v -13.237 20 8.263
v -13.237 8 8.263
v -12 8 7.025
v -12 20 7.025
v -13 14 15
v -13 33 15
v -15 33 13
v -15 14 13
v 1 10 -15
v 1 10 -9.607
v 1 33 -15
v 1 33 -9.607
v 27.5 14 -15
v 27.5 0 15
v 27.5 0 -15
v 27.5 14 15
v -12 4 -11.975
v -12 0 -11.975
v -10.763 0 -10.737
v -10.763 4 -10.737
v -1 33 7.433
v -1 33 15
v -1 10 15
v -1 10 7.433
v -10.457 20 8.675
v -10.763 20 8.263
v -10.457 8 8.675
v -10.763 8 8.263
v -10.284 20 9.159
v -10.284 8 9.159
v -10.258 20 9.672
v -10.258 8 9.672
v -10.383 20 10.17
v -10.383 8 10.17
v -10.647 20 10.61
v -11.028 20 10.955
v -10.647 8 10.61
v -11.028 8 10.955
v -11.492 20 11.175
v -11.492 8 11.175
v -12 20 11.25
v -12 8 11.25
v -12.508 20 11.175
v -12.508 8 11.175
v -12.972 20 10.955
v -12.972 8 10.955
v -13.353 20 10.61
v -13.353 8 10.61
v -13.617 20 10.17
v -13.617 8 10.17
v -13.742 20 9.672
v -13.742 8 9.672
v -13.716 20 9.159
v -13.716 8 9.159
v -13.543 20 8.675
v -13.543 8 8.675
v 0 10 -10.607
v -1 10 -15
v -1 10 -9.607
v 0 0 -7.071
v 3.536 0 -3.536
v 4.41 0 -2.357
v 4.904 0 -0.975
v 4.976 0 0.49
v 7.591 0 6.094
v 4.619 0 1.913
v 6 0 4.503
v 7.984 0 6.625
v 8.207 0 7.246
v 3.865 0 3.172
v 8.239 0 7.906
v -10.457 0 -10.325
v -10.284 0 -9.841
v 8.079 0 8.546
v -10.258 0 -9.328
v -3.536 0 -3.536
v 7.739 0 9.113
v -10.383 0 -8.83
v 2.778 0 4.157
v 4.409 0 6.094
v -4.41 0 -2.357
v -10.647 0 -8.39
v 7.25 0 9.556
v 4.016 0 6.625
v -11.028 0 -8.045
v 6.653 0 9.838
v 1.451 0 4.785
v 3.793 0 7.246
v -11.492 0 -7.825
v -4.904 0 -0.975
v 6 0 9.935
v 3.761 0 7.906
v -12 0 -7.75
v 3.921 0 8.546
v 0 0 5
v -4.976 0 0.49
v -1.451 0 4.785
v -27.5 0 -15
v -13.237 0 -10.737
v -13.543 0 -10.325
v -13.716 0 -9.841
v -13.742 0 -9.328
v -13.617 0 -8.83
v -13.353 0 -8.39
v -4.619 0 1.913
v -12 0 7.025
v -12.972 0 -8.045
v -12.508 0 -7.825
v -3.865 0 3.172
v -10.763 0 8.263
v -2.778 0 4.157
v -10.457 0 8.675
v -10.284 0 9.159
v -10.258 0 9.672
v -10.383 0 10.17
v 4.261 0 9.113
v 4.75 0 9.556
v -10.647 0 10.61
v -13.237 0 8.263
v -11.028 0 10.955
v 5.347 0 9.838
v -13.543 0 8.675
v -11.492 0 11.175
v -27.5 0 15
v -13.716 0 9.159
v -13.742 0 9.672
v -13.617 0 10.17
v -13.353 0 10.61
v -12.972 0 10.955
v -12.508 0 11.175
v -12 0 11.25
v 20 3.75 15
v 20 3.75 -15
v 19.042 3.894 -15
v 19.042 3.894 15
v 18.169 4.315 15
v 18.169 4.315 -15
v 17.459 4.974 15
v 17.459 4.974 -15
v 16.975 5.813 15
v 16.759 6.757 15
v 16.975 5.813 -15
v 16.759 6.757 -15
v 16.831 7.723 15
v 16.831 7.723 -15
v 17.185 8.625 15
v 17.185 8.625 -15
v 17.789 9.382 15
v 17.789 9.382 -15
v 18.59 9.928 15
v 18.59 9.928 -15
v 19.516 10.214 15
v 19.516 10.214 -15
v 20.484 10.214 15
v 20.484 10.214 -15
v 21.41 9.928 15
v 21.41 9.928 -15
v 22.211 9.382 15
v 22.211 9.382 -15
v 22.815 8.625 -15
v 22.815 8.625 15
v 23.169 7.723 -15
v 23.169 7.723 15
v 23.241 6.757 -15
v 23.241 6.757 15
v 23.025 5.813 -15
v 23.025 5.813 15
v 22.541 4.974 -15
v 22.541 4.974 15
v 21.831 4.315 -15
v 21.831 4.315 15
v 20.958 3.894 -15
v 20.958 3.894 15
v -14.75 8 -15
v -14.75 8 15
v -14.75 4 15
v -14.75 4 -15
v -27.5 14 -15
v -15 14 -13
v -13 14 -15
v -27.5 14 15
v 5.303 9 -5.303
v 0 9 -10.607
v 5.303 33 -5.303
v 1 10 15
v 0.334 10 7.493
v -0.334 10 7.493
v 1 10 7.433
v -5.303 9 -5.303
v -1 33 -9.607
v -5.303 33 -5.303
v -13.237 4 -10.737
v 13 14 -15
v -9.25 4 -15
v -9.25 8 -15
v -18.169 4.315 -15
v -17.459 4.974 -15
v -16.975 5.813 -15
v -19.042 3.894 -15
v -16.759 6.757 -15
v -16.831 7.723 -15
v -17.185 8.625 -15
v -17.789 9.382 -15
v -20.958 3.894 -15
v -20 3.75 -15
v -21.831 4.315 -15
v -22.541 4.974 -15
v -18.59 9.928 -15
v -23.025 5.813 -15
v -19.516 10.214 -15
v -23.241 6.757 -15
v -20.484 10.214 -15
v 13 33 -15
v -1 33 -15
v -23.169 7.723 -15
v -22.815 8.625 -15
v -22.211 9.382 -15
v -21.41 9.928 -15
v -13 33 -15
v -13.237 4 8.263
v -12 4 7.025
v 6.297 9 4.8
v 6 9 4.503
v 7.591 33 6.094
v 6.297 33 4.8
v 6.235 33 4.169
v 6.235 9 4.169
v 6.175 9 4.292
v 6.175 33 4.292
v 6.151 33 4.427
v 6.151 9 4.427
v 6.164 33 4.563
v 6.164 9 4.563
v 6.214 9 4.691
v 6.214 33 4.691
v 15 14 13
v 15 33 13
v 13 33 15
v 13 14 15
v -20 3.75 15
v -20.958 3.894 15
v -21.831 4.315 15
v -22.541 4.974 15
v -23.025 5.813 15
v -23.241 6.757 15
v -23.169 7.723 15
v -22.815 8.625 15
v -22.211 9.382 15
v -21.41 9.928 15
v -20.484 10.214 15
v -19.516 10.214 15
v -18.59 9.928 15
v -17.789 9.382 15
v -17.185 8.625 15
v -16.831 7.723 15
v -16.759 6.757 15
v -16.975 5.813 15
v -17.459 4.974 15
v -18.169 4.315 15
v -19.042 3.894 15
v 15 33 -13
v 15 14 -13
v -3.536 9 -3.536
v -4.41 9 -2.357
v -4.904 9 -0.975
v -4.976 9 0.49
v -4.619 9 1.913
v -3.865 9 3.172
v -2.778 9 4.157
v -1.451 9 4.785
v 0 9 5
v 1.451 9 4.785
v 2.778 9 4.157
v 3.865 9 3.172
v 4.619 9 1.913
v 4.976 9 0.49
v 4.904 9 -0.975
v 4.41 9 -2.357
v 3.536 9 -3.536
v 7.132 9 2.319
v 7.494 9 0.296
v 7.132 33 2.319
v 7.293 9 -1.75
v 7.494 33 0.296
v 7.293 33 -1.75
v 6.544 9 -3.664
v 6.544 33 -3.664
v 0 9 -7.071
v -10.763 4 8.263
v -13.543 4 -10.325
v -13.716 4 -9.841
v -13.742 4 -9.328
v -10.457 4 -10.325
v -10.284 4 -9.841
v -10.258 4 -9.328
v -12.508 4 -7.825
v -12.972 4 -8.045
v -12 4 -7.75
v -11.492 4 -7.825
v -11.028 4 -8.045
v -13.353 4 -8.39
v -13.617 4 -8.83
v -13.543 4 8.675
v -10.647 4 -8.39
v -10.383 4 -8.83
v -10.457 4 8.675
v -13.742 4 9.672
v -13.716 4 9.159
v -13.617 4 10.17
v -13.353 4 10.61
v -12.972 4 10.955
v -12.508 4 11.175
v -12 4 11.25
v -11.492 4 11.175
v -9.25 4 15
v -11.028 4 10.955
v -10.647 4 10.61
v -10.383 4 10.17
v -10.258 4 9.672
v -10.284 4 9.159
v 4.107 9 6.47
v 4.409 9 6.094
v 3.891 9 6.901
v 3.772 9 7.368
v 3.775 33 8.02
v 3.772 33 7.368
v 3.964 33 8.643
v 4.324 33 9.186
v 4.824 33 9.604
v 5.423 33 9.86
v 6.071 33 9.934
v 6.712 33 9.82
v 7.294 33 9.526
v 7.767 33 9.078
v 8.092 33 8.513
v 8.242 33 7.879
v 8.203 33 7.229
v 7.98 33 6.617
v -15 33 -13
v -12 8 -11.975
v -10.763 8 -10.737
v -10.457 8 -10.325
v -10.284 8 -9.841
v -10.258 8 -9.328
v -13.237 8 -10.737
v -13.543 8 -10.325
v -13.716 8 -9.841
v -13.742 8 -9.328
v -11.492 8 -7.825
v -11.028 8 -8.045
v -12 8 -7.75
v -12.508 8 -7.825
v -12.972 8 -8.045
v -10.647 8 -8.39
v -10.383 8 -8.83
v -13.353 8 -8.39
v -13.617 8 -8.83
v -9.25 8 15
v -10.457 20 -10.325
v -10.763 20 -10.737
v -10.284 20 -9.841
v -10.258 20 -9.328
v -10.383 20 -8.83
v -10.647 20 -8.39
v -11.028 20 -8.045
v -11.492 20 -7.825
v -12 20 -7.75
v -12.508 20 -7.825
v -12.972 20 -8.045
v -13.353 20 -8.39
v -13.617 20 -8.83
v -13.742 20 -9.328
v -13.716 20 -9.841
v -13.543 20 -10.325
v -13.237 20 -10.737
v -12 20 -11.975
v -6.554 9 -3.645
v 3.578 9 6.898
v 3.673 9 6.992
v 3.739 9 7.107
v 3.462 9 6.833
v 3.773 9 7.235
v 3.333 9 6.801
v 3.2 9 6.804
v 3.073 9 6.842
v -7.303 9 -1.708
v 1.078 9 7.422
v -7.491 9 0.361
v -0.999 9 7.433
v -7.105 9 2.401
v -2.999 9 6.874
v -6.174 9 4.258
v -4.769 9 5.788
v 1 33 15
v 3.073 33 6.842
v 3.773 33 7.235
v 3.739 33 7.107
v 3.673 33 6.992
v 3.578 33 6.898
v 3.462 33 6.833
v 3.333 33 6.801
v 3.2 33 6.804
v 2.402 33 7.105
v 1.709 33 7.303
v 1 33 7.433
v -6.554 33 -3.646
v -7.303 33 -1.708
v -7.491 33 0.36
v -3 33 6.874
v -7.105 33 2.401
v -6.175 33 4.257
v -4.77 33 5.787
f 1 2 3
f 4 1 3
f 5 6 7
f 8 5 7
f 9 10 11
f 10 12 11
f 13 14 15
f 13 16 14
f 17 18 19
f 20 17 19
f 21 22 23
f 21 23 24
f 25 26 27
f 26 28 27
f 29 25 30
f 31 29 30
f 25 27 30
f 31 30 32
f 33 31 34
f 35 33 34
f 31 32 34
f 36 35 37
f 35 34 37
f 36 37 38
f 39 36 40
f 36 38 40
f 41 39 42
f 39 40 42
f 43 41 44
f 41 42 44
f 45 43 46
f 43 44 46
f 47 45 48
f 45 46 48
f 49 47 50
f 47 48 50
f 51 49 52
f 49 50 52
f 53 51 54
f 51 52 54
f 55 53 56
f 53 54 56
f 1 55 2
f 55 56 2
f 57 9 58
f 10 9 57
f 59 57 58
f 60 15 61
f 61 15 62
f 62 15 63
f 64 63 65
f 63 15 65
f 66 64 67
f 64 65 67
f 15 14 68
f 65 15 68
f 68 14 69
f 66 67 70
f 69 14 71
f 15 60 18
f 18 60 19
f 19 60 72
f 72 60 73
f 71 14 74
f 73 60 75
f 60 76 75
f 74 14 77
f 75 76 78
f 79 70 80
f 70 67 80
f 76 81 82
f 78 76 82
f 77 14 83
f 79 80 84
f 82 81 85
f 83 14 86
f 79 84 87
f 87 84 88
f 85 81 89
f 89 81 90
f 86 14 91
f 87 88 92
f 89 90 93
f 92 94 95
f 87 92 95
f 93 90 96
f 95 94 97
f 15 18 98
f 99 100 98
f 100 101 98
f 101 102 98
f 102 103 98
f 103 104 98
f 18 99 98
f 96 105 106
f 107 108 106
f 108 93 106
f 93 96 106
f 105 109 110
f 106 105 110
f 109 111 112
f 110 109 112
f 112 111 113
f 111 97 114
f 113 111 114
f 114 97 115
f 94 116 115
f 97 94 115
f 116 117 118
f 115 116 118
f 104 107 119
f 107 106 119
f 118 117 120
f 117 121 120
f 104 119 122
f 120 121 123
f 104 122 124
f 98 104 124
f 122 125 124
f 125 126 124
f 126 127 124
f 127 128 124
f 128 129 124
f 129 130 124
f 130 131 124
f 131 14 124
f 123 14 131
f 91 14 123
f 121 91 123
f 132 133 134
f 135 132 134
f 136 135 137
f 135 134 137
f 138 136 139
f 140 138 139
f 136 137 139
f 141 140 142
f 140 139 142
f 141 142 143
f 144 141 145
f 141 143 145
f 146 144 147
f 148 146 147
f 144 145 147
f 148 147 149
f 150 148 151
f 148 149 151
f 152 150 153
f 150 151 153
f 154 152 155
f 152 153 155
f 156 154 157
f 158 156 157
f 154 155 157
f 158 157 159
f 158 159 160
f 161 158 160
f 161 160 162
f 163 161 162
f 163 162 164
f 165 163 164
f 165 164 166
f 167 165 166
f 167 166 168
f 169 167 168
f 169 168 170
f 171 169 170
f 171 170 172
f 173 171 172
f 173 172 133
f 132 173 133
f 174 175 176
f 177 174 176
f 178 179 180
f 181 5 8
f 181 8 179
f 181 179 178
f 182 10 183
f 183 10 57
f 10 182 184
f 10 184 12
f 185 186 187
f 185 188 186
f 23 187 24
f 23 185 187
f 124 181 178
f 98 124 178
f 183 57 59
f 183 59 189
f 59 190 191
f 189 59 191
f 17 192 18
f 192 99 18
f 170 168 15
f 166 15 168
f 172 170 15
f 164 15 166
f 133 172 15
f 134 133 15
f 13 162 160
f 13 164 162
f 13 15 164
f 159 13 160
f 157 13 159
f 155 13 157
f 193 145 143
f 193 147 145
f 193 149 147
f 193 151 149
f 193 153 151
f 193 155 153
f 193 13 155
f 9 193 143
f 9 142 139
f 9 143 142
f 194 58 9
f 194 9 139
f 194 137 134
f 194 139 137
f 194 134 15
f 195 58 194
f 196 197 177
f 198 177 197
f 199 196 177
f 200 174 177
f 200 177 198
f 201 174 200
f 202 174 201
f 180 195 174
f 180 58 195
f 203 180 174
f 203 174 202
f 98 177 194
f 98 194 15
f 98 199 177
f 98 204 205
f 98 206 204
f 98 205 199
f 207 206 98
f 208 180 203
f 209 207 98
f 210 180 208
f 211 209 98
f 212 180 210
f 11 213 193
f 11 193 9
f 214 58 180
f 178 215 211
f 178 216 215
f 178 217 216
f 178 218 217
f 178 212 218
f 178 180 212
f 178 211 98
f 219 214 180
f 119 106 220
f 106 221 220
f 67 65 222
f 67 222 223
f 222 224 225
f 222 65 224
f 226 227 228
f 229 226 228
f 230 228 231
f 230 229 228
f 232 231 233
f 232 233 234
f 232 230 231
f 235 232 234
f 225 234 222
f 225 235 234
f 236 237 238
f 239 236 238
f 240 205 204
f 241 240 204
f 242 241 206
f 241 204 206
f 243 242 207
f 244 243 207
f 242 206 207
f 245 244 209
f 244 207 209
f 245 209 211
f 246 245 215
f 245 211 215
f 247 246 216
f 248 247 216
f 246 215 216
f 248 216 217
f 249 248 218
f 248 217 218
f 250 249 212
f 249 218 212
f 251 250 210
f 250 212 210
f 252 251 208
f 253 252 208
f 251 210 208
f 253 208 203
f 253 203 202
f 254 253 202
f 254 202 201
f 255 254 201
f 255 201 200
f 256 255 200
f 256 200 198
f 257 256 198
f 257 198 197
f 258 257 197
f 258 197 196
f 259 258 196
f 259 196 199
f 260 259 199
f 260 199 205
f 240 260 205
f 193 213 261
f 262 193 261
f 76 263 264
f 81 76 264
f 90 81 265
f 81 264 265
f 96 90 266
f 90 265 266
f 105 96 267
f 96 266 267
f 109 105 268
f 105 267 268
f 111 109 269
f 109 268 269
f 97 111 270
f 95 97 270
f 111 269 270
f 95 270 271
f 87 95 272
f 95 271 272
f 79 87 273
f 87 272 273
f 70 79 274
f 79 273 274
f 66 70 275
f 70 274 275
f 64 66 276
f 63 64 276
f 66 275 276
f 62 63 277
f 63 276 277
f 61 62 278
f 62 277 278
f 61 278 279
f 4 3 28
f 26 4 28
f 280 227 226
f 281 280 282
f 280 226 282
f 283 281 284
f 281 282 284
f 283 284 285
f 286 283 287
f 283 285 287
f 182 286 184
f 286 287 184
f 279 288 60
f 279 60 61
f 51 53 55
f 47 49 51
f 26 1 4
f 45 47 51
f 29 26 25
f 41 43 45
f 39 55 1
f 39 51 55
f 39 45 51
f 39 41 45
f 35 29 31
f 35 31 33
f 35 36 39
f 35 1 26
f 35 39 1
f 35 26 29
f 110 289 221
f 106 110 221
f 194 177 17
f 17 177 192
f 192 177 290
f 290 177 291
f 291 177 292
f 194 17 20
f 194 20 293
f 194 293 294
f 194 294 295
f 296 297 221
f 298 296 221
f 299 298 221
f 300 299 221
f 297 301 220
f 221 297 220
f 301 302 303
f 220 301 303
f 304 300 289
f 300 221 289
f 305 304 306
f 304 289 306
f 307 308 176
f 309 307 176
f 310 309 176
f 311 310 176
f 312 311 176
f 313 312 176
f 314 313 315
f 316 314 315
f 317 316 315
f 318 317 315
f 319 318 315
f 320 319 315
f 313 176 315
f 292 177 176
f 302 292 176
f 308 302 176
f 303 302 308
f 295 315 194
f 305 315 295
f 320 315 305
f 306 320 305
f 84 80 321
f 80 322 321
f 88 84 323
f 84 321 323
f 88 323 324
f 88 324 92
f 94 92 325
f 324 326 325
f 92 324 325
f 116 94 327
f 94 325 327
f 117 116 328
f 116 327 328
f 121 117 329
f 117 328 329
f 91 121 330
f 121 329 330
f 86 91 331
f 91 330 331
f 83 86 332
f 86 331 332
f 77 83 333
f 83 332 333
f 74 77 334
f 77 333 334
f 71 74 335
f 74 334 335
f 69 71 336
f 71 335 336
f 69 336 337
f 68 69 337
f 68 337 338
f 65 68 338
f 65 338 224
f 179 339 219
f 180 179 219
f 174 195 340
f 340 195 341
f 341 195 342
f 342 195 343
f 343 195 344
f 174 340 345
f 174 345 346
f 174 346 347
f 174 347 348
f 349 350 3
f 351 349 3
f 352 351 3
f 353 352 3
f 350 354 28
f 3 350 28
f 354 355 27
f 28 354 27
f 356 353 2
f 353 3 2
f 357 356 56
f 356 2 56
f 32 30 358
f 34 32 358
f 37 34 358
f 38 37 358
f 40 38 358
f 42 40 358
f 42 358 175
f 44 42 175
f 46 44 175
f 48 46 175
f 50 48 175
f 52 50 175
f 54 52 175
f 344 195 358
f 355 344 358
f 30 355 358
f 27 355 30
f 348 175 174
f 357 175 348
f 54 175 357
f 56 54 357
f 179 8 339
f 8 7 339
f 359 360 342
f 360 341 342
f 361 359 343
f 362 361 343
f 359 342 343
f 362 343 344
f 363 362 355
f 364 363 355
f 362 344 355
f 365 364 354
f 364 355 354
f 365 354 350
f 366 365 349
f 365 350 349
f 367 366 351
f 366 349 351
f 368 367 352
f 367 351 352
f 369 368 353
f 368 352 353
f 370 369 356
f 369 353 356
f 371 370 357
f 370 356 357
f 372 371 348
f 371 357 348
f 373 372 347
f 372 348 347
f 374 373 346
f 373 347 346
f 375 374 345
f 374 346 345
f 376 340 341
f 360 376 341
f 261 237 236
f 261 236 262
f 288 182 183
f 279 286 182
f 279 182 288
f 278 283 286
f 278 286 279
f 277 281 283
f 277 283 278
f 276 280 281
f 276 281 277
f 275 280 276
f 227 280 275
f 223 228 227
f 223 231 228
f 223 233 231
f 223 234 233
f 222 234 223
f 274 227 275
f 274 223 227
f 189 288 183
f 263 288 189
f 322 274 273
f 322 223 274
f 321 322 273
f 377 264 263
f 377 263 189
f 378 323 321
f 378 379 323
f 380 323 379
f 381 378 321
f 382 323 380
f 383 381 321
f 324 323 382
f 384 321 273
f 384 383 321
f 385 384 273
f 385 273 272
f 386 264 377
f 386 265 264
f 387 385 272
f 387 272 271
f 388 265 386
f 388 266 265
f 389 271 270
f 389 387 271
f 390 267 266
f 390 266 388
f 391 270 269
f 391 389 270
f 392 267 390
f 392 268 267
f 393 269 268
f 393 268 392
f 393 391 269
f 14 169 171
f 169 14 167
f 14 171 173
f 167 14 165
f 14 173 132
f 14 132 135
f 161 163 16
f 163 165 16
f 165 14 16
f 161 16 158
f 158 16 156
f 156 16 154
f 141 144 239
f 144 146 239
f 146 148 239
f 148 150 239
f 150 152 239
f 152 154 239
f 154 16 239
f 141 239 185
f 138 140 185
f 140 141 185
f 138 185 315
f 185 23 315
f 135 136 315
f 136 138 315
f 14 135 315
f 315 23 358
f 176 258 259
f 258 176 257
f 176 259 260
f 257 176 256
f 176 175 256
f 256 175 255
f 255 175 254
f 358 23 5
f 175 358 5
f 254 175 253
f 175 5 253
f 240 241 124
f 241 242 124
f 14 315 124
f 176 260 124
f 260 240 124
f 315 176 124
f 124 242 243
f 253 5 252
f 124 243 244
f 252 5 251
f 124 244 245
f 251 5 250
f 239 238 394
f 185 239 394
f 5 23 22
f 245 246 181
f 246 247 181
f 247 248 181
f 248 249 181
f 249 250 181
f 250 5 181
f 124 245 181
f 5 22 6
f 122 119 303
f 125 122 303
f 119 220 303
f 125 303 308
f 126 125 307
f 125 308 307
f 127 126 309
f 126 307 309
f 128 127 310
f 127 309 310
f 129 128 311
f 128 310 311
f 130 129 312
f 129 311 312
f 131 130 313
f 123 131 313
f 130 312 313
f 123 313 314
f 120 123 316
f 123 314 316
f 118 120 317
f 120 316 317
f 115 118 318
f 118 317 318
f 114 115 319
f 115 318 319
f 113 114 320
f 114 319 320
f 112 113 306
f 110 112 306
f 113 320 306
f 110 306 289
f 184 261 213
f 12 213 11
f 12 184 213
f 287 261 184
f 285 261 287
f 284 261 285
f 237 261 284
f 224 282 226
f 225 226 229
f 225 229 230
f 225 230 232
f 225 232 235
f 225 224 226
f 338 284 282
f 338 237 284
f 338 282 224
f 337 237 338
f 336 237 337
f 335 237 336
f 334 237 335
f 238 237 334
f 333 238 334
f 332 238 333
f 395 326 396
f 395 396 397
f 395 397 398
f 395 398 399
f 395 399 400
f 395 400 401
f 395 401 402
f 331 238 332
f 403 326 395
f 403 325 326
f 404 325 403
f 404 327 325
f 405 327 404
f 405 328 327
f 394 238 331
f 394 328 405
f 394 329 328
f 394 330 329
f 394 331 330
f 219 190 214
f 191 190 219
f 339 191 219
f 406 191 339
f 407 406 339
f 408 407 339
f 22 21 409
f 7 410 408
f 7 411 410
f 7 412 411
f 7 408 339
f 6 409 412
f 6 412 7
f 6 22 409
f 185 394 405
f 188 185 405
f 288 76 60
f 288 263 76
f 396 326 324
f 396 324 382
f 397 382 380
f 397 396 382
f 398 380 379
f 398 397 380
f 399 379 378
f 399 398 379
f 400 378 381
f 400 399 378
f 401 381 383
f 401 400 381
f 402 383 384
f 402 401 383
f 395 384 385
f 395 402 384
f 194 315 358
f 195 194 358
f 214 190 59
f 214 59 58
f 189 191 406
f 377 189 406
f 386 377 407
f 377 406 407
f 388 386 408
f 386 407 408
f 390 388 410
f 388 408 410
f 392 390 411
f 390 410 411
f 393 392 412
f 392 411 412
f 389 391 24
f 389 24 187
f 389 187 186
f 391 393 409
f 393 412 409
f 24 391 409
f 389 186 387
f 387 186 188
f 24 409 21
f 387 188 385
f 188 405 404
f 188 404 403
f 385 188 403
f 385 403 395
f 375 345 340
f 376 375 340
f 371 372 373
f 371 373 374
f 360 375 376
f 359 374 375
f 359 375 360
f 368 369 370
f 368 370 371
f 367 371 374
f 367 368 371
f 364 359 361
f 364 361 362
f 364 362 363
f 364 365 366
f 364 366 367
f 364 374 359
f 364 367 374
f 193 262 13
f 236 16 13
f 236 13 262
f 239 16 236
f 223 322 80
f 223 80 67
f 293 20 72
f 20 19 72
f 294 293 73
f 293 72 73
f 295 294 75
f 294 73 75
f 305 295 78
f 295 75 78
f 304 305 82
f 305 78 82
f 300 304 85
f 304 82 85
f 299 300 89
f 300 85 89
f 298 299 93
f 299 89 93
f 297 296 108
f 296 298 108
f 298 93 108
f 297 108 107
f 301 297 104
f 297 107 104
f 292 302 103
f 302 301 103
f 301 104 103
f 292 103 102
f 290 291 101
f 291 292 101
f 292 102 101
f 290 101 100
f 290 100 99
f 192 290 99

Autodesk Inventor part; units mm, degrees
ref_plane "YZ Plane" through (0, 0, 0) normal (1, 0, 0) x (0, 1, 0)
ref_plane "XY Plane" through (0, 0, 0) normal (0, 0, 1) x (1, 0, 0)
ref_plane "Work Plane1" through (0, 33, 0) normal (0, 1, 0) x (-1, 0, 0)
sketch "Sketch1" plane through (0, 33, 0) normal (0, 1, 0) x (-1, 0, 0)
  line L0 (-27.5, 15) -> (-27.5, -15)
  line L1 (-27.5, 15) -> (27.5, 15)
  line L2 (27.5, 15) -> (27.5, -15)
  line L3 (-27.5, -15) -> (27.5, -15)
extrude "Extrusion13" add sketch "Sketch1" against normal blind 33
sketch "Sketch2" plane through (-27.5, 33, 15) normal (0, 0, 1) x (1, 0, 0)
  line L0 (18.25, -25) -> (12.75, -25)
  line L1 (12.75, -29) -> (18.25, -29)
  line L2 (18.25, -29) -> (18.25, -25)
  line L3 (12.75, -25) -> (12.75, -29)
extrude "Extrusion12" cut sketch "Sketch2" against normal blind 30
sketch "Sketch3" plane through (-14.75, 4, 15) normal (0, 1, 0) x (1, 0, 0)
  arc A0 (1.5126, 6.7374) -> (3.9874, 6.7374) centre (2.75, 5.5) ccw
  line L0 (3.9874, 6.7374) -> (2.75, 7.9749)
  line L1 (2.75, 7.9749) -> (1.5126, 6.7374)
extrude "Extrusion11" cut sketch "Sketch3" against normal blind 4
sketch "Sketch4" plane through (0, 0, 0) normal (0, 1, 0) x (-1, 0, 0)
  arc A0 (13.2374, -10.7374) -> (10.7626, -10.7374) centre (12, -9.5) ccw
  line L0 (13.2374, -10.7374) -> (12, -11.9749)
  line L1 (12, -11.9749) -> (10.7626, -10.7374)
extrude "Extrusion10" cut sketch "Sketch4" along normal blind 4
sketch "Sketch5" plane through (-14.75, 8, 15) normal (0, -1, 0) x (1, 0, 0)
  line L0 (2.75, -7.9749) -> (3.9874, -6.7374)
  line L1 (1.5126, -6.7374) -> (2.75, -7.9749)
  arc A0 (3.9874, -6.7374) -> (1.5126, -6.7374) centre (2.75, -5.5) ccw
extrude "Extrusion9" cut sketch "Sketch5" against normal blind 12
sketch "Sketch6" plane through (-14.75, 8, 15) normal (0, -1, 0) x (1, 0, 0)
  line L0 (2.75, -26.9749) -> (3.9874, -25.7374)
  line L1 (1.5126, -25.7374) -> (2.75, -26.9749)
  arc A0 (3.9874, -25.7374) -> (1.5126, -25.7374) centre (2.75, -24.5) ccw
extrude "Extrusion8" cut sketch "Sketch6" against normal blind 12
sketch "Sketch7" plane through (0, 33, 0) normal (0, 1, 0) x (-1, 0, 0)
  line L0 (-4.409, 6.0942) -> (-6, 4.5032)
  arc A0 (-4.409, 6.0942) -> (-7.591, 6.0942) centre (-6, 7.6852) ccw
  line L1 (-7.591, 6.0942) -> (-6, 4.5032)
extrude "Extrusion7" cut sketch "Sketch7" against normal blind 33
sketch "Sketch8" plane through (0, 33, 0) normal (0, 1, 0) x (-1, 0, 0)
  line L0 (-5.3033, -5.3033) -> (0, -10.6066)
  arc A0 (-3.7724, 7.3683) -> (-3.0726, 6.8417) centre (-3.2774, 7.2978) ccw
  arc A1 (-4.409, 6.0942) -> (-3.7724, 7.3683) centre (-6, 7.6852) ccw
  line L1 (0, -10.6066) -> (5.3033, -5.3033)
  arc A2 (5.3033, -5.3033) -> (-3.0726, 6.8417) centre (0, 0) ccw
  line L2 (-6, 4.5032) -> (-4.409, 6.0942)
  line L3 (-6.2969, 4.8001) -> (-6, 4.5032)
  arc A3 (-6.2348, 4.1686) -> (-6.2969, 4.8001) centre (-6.6504, 4.4466) ccw
  arc A4 (-6.2348, 4.1686) -> (-5.3033, -5.3033) centre (0, 0) ccw
extrude "Extrusion6" cut sketch "Sketch8" against normal blind 24 draft 0
sketch "Sketch9" plane through (0, 33, 0) normal (0, 1, 0) x (-1, 0, 0)
  line L0 (0, -10.6066) -> (-1, -9.6066)
  line L1 (1, -9.6066) -> (0, -10.6066)
  line L2 (-1, -9.6066) -> (-1, -15)
  line L3 (-1, -15) -> (1, -15)
  line L4 (1, -9.6066) -> (1, -15)
extrude "Extrusion5" cut sketch "Sketch9" against normal blind 23 draft 0
sketch "Sketch10" plane through (0, 33, 0) normal (0, 1, 0) x (-1, 0, 0)
  line L0 (-1, 15) -> (1, 15)
  arc A0 (1, 7.433) -> (-1, 7.433) centre (0, 0) ccw
  line L1 (-1, 15) -> (-1, 7.433)
  line L2 (1, 15) -> (1, 7.433)
extrude "Extrusion4" cut sketch "Sketch10" against normal blind 23 draft 0
sketch "Sketch11" plane through (0, 33, 0) normal (0, 1, 0) x (-1, 0, 0)
  line L0 (15, -13) -> (13, -15)
  line L1 (13, 15) -> (27.5, 15)
  line L2 (15, 13) -> (15, -13)
  line L3 (27.5, 15) -> (27.5, -15)
  line L4 (13, 15) -> (15, 13)
  line L5 (13, -15) -> (27.5, -15)
extrude "Extrusion3" cut sketch "Sketch11" against normal blind 19 draft 0
sketch "Sketch12" plane through (0, 33, 0) normal (0, 1, 0) x (-1, 0, 0)
  line L0 (-27.5, 15) -> (-13, 15)
  line L1 (-13, -15) -> (-15, -13)
  line L2 (-15, 13) -> (-13, 15)
  line L3 (-27.5, -15) -> (-13, -15)
  line L4 (-27.5, 15) -> (-27.5, -15)
  line L5 (-15, 13) -> (-15, -13)
extrude "Extrusion2" cut sketch "Sketch12" against normal blind 19 draft 0
sketch "Sketch13" plane through (0, 9, 0) normal (0, 1, 0) x (1, 0, 0)
  line L0 (0, 7.0711) -> (3.5355, 3.5355)
  arc A0 (-3.5355, 3.5355) -> (3.5355, 3.5355) centre (0, 0) ccw
  line L1 (-3.5355, 3.5355) -> (0, 7.0711)
extrude "Extrusion1" cut sketch "Sketch13" against normal blind 9
hole "Hole2" at (20, 7, 15) direction (0, 0, -1) diameter 6.5 depth 30
sketch "Sketch14" plane through (-27.5, 0, 15) normal (0, 0, 1) x (1, 0, 0)
  point P0 (47.5, 7)
hole "Hole1" at (-20, 7, 15) direction (0, 0, -1) diameter 6.5 depth 30
sketch "Sketch15" plane through (-27.5, 0, 15) normal (0, 0, 1) x (1, 0, 0)
  point P0 (7.5, 7)
properties part number "Hopper Linear Bearing Holder" material "ASA Plastic"
